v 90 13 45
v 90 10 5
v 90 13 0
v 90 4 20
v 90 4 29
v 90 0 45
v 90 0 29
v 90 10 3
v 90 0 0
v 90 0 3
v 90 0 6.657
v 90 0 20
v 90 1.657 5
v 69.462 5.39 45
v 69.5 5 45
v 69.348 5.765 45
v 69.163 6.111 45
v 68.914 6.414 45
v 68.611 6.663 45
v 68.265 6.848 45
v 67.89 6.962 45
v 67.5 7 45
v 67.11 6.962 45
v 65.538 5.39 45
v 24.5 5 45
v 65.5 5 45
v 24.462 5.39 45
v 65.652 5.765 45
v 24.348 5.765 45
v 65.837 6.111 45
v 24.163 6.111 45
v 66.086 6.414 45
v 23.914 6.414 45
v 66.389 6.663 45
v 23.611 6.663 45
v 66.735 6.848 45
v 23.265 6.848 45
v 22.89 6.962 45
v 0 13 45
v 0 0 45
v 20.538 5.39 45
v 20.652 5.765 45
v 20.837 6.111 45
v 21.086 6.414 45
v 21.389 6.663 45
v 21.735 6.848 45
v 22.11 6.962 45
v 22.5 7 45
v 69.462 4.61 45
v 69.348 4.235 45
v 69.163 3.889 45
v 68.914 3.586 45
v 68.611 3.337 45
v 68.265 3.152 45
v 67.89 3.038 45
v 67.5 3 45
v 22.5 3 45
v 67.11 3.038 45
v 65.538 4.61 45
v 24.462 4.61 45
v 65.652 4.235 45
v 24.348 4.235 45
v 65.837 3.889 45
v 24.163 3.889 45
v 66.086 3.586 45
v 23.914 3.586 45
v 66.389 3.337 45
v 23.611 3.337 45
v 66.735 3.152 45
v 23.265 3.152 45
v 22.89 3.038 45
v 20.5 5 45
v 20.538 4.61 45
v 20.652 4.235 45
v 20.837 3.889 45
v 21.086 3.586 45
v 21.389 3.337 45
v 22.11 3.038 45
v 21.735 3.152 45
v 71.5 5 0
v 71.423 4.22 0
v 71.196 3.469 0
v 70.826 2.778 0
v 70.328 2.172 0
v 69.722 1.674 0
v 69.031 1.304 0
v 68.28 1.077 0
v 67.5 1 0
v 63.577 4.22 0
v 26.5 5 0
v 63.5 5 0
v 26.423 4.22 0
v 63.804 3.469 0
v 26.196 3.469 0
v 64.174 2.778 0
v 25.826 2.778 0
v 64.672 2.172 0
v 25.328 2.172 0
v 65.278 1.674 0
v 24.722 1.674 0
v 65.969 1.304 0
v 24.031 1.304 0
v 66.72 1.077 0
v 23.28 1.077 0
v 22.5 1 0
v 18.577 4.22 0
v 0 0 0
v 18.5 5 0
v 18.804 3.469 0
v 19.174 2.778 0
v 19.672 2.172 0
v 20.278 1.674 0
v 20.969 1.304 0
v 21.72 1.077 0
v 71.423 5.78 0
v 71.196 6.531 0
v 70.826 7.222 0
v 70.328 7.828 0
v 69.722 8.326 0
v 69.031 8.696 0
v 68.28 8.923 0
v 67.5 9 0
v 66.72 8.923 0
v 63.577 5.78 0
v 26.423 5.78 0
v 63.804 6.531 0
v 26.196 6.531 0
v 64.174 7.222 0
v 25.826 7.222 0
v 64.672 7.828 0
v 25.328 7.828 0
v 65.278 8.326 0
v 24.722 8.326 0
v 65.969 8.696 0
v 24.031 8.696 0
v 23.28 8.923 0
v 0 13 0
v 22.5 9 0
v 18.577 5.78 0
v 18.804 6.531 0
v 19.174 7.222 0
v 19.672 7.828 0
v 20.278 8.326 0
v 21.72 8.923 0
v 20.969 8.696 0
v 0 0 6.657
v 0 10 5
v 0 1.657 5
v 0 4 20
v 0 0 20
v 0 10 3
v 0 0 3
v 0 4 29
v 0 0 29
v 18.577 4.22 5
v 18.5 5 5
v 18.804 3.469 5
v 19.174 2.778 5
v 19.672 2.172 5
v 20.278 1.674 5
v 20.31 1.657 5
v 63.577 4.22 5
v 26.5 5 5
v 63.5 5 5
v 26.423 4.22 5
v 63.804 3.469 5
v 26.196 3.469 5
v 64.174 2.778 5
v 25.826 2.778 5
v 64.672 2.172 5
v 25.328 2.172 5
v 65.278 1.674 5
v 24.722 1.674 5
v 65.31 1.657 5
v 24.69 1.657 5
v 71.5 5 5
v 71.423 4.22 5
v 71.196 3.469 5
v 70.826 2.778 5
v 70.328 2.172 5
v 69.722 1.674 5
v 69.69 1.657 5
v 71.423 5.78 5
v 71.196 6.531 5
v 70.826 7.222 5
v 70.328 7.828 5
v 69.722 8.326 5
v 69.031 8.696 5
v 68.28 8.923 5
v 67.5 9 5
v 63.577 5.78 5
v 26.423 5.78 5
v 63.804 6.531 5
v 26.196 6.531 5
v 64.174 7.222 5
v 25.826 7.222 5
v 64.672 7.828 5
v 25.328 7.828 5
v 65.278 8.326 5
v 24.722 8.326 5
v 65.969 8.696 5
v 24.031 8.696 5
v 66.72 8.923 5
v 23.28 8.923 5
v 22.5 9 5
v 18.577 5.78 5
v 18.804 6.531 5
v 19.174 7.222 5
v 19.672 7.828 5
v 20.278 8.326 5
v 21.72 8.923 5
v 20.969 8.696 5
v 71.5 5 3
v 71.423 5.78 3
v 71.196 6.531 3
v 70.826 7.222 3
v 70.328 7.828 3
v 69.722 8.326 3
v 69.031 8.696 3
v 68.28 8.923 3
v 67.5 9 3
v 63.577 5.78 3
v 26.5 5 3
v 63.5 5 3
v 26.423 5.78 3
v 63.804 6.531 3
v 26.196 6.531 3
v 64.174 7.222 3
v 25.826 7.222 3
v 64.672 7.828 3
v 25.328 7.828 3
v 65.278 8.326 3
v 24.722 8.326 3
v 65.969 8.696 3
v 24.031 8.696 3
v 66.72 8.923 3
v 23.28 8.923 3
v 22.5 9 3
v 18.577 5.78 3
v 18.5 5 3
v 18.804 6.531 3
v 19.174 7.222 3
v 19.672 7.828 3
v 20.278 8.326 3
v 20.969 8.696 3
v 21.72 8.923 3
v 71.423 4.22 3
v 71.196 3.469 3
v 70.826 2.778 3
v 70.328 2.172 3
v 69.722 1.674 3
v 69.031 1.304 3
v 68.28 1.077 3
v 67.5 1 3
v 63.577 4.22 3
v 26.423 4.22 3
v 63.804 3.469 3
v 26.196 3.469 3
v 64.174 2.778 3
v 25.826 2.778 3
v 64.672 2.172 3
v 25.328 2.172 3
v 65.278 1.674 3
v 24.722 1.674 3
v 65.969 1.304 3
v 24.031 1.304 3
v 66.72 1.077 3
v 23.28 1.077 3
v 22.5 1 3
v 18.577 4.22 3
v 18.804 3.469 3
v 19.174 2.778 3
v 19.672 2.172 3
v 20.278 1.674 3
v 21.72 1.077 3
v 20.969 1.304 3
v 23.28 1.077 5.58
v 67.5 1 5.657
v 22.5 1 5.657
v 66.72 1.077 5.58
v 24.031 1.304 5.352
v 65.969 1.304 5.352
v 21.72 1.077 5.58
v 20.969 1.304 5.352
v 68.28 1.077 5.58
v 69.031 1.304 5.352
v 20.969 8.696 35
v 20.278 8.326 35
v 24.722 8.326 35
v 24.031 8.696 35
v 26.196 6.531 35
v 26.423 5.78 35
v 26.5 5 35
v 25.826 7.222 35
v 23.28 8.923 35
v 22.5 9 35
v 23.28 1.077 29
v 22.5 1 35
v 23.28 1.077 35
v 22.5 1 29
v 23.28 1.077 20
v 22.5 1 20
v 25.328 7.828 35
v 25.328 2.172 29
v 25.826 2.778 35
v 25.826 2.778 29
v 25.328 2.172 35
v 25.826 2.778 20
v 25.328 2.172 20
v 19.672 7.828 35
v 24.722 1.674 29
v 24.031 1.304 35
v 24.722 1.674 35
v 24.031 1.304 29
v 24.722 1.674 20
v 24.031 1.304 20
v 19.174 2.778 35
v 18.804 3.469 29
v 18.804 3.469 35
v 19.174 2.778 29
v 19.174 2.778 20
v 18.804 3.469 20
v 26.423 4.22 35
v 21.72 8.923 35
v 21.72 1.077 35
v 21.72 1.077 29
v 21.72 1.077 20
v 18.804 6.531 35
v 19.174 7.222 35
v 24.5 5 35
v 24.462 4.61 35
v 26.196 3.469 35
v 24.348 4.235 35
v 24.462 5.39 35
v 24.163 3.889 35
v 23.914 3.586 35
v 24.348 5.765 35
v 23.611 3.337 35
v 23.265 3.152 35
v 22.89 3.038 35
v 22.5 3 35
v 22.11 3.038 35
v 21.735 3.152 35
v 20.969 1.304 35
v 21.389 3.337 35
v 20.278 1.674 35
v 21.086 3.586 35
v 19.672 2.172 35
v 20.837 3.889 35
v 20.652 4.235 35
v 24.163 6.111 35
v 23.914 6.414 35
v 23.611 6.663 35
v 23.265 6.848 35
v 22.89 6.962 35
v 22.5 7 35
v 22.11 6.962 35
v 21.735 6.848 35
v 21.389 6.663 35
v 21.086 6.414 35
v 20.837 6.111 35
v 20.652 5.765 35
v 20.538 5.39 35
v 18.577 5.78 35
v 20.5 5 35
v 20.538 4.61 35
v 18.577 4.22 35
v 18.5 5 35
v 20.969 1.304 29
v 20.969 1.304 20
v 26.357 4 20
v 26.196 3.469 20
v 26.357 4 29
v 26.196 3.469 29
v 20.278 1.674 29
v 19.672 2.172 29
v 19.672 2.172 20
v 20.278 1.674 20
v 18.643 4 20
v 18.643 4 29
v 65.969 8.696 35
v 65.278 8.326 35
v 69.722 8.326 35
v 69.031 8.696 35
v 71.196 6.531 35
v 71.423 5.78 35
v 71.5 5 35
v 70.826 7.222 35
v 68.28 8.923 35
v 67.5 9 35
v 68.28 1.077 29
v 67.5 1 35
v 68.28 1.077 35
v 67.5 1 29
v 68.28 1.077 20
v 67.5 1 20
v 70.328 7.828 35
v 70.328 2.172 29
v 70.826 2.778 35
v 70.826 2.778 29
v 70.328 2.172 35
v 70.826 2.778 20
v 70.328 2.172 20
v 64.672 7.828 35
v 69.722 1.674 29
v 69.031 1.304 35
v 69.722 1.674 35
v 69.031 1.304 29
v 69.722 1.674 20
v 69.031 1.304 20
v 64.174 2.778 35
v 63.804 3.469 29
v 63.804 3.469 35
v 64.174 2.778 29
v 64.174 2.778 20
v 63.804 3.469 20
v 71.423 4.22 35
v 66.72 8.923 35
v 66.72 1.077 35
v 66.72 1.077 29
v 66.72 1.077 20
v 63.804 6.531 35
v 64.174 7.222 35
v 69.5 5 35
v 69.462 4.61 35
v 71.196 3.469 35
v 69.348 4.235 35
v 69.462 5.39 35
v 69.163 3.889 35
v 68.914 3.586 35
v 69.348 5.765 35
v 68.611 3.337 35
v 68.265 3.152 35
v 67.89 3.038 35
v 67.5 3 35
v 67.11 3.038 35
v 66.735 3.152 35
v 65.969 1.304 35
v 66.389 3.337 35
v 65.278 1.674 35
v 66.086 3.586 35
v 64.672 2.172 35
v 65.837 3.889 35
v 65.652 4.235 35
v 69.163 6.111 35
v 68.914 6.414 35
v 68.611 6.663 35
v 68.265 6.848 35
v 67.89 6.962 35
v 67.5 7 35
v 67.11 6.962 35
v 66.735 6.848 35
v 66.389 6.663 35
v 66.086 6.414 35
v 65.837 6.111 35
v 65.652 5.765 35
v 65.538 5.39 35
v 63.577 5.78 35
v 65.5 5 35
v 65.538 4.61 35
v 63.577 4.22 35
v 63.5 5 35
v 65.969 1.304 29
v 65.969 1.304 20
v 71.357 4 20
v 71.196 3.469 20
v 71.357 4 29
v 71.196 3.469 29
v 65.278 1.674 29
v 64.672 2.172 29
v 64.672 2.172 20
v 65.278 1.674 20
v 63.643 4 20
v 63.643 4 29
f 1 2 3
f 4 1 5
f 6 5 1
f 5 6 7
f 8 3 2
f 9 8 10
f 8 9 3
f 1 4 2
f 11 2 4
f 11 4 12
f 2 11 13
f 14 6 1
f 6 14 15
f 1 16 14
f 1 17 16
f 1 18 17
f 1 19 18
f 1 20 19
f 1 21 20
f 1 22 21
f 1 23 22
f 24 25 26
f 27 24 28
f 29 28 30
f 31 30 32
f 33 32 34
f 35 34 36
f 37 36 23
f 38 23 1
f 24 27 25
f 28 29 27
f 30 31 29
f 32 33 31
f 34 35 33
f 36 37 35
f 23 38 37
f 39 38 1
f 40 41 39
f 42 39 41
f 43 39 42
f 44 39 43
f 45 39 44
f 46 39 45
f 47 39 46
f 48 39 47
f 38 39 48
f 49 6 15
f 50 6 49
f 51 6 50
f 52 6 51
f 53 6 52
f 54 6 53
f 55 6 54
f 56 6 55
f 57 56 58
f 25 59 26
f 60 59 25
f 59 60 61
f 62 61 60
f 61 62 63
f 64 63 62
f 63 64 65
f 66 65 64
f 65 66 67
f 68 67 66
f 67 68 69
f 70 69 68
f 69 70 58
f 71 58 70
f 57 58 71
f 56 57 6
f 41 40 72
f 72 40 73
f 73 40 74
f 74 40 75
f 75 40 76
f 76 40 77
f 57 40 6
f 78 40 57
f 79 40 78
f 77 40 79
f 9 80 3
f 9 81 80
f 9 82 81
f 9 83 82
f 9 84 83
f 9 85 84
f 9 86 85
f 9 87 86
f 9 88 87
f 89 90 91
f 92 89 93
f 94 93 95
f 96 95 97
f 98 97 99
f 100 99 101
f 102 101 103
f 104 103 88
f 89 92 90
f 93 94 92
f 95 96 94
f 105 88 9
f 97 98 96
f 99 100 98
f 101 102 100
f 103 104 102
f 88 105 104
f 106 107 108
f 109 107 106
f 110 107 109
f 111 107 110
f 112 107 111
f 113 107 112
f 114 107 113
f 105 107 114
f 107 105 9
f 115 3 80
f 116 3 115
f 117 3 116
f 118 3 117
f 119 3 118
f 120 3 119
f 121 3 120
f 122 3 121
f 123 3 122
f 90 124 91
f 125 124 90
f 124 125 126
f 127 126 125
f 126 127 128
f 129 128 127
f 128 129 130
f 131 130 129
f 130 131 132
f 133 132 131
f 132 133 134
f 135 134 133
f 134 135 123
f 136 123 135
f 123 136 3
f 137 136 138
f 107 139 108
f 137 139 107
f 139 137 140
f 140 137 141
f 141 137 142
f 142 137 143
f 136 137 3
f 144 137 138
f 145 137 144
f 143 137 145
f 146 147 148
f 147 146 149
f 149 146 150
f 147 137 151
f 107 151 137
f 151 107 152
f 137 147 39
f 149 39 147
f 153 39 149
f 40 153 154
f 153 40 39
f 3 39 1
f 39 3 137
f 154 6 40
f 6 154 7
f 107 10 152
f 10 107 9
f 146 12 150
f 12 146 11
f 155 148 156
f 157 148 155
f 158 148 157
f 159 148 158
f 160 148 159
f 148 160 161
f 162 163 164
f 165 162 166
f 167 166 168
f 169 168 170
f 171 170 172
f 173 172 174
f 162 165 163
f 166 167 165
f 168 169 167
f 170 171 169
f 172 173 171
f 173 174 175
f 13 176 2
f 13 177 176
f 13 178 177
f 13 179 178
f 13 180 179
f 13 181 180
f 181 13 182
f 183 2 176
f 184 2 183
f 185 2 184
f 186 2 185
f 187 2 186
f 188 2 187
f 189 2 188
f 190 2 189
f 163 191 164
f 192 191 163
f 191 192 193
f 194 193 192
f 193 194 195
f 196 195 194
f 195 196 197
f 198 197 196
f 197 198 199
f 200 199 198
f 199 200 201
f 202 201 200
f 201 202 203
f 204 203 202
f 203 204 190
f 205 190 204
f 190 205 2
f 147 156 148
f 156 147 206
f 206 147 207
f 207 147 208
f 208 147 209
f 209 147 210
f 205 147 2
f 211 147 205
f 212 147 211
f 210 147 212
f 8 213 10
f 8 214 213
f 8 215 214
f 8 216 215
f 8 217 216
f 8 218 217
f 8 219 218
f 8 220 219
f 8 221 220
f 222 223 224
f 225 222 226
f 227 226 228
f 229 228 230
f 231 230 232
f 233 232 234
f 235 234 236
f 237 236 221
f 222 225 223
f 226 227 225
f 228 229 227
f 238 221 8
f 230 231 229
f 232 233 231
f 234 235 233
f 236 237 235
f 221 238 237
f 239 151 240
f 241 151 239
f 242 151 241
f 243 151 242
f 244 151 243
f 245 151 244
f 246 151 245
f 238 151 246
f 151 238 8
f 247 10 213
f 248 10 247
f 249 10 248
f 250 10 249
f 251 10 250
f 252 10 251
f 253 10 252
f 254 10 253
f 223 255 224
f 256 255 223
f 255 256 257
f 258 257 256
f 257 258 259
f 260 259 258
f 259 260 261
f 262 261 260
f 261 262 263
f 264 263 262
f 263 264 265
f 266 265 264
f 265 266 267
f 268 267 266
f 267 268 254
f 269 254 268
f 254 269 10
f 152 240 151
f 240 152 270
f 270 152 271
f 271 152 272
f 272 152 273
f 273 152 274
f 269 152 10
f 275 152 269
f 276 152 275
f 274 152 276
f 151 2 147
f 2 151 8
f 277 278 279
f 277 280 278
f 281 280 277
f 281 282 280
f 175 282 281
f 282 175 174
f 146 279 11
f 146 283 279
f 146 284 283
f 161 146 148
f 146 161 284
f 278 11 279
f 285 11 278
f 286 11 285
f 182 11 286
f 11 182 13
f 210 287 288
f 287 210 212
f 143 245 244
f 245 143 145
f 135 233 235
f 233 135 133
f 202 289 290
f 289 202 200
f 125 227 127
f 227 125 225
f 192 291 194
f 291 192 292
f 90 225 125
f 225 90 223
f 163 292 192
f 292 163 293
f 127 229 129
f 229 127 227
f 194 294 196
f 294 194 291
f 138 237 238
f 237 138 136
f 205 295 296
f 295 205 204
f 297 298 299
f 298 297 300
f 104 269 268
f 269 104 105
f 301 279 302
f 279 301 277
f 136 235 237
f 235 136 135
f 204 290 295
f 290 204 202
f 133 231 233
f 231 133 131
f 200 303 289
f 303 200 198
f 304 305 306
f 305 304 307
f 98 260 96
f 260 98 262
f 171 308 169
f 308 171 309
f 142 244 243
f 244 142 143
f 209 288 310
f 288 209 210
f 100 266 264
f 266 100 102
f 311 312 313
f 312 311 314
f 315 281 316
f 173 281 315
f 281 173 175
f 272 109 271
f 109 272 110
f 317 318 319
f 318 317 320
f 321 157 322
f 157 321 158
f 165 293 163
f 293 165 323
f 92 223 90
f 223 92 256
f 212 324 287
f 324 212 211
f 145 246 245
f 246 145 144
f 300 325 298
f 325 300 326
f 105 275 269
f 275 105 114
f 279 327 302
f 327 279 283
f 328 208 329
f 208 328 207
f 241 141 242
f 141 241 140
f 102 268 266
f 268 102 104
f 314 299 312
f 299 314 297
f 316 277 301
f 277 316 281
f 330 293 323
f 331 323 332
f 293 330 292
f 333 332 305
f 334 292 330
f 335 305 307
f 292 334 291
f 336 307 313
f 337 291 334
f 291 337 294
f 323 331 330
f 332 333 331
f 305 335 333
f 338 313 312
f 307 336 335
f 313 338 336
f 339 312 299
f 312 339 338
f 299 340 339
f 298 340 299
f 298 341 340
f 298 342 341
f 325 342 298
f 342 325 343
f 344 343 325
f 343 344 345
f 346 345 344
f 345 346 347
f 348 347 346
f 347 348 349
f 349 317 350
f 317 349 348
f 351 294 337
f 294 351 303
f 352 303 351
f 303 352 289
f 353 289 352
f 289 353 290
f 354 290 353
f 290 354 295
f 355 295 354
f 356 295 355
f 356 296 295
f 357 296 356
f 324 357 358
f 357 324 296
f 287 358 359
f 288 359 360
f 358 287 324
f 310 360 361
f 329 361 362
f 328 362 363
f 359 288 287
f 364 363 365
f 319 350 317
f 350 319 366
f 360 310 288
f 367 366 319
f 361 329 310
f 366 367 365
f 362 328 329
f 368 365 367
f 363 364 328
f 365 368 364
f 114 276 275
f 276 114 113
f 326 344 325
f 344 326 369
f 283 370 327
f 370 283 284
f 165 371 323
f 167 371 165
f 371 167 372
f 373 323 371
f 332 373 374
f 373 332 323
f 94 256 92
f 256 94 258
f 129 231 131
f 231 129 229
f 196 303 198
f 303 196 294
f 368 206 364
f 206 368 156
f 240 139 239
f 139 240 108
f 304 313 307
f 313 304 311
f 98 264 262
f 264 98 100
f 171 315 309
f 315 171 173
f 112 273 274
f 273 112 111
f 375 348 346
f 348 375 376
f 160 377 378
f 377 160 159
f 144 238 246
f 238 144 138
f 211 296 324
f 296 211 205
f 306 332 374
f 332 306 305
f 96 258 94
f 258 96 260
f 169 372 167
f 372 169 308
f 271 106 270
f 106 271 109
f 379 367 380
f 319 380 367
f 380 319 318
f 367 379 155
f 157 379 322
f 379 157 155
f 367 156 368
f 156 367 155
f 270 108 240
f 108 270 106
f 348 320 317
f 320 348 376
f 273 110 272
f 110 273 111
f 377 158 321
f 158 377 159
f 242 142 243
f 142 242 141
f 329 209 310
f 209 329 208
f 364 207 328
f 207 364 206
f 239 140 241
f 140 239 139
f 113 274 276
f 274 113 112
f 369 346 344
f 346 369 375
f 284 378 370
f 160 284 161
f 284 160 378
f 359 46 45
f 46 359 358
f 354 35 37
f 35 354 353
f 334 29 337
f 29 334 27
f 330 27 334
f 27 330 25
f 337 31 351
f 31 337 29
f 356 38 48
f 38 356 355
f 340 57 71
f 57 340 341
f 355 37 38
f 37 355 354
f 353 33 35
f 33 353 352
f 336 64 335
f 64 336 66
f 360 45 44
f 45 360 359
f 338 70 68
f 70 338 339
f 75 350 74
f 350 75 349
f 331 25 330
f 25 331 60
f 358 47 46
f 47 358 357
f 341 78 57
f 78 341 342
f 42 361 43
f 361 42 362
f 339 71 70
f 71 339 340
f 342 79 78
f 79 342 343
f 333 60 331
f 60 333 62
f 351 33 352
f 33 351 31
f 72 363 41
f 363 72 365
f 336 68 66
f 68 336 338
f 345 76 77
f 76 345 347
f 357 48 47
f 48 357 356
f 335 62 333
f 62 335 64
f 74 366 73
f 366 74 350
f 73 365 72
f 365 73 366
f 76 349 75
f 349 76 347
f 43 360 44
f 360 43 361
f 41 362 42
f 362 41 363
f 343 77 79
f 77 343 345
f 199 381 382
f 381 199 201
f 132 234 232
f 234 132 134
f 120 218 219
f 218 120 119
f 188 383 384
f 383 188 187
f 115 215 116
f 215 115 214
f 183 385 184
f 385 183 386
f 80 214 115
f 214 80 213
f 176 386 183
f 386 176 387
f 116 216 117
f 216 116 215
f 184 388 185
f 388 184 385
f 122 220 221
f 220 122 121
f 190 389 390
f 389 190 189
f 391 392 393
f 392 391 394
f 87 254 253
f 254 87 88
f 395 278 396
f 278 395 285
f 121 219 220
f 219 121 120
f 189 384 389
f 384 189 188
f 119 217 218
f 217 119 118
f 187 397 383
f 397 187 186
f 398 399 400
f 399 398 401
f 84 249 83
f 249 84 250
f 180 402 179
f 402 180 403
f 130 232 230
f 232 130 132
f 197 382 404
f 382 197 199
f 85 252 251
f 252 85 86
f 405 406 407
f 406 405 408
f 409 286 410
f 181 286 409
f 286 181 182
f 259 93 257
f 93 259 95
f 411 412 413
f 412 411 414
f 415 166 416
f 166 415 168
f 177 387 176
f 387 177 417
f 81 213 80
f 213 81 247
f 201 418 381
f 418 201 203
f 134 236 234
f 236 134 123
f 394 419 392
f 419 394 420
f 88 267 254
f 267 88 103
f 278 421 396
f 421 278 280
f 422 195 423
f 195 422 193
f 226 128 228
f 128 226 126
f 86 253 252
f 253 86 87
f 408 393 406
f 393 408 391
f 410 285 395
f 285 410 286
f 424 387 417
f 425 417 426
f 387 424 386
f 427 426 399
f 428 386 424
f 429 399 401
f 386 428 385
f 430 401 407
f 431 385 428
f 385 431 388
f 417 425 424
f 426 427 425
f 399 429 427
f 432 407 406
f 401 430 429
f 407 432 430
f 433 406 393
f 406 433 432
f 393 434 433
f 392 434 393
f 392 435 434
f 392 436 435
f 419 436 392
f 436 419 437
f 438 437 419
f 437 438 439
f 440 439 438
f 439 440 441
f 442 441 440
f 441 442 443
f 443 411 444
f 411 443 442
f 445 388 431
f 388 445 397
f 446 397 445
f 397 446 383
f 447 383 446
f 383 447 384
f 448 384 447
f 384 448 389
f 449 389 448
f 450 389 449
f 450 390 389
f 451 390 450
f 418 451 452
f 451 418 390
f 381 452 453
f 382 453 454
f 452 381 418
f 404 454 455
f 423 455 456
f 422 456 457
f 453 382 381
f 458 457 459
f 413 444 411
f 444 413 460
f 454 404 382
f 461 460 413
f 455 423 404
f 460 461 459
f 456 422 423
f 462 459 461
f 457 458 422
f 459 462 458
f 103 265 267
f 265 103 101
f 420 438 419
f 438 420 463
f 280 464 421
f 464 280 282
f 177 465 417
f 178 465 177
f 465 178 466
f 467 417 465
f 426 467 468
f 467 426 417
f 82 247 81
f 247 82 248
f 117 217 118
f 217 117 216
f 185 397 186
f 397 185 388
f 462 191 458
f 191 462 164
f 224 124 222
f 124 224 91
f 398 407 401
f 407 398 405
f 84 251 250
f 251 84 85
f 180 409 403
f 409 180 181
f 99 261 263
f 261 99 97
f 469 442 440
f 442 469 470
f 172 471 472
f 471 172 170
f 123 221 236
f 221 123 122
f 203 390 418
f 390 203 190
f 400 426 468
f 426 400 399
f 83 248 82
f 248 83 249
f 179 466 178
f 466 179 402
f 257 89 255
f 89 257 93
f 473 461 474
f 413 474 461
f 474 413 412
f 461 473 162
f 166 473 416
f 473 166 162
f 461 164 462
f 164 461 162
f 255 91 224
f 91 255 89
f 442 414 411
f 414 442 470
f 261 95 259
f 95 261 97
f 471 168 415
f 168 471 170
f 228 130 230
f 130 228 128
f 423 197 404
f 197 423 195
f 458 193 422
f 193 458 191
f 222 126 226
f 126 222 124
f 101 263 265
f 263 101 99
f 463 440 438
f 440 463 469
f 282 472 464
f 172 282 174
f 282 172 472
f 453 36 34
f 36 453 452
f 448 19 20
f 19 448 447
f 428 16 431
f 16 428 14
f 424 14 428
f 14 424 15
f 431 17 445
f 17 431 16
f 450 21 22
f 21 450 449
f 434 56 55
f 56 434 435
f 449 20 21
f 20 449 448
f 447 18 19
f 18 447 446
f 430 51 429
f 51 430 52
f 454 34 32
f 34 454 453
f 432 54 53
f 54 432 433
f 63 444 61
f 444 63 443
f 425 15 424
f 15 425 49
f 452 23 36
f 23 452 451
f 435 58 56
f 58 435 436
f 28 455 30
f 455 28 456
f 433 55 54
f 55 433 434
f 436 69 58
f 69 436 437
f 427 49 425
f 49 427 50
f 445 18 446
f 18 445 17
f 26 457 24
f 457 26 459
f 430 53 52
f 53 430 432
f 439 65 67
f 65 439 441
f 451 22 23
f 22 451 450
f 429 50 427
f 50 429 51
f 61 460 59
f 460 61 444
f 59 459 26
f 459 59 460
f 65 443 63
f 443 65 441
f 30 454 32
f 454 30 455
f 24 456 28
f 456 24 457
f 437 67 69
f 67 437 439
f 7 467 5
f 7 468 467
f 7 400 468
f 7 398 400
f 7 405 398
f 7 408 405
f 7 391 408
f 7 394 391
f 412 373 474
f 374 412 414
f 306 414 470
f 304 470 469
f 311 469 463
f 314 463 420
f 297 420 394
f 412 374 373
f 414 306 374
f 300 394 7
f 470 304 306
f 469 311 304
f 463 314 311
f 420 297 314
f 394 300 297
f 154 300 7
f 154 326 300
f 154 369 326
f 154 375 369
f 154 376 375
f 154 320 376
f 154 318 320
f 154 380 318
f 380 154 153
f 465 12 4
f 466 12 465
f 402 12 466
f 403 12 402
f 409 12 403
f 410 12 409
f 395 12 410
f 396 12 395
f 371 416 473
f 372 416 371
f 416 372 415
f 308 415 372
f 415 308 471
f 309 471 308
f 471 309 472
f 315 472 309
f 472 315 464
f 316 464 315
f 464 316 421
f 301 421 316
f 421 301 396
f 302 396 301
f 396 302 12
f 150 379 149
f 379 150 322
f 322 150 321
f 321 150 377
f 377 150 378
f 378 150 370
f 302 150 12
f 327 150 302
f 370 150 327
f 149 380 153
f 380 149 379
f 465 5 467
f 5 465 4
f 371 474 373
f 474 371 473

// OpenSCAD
//Height of the spacer, default is flush with the mounting surface.
spacer_height = 45; // [45:90]

//Radius of hole to fix screw length.
screw_head_radius = 4; // [2:4.5]

//Radius of screw thread.
screw_radius = 2; // [1:4.5]

//Length of thread to be inside spacer.
screw_length = 10; // [3:45]
head_hole_height = spacer_height - screw_length;

difference() {
	difference() {
		difference() {
			difference() {
				difference() {
					cube(size = [90, 13, spacer_height]);
					translate(v = [0, 0, 3]) {
						cube(size = [90, 10, 2]);
					}
				}
				translate(v = [0, -1, 0]) {
					translate(v = [0, 0, 2]) {
						rotate(a = spacer_height, v = [1, 0, 0]) {
							cube(size = [90, 4, 4]);
						}
					}
				}
			}
			translate(v = [22.5000000000, 0, 0]) {
				translate(v = [0, 5, 0]) {
					union() {
						cylinder($fn = 32, h = head_hole_height, r = screw_head_radius);
						translate(v = [0, 0, head_hole_height]) {
							cylinder($fn = 32, h = screw_length, r = screw_radius);
						}
					}
				}
			}
		}
		translate(v = [67.5000000000, 0, 0]) {
			translate(v = [0, 5, 0]) {
				union() {
					cylinder($fn = 32, h = head_hole_height, r = screw_head_radius);
					translate(v = [0, 0, head_hole_height]) {
						cylinder($fn = 32, h = screw_length, r = screw_radius);
					}
				}
			}
		}
	}
	translate(v = [0, 0, 20]) {
		cube(size = [90, 4, 9]);
	}
}
/***********************************************
*********      SolidPython code:      **********
************************************************
 
''' Mounting spacers for lvpin LP-2020a+ stereo

Spacers which allow an lvpin LP-2020a+ stereo to be mounted under a bench,
table or cabinet. There is a slot to allow for wires to pass through to the
front (I am using them for the power and audio of my music source).

Customised parameters allow different sized screws to be used for mounting.

This work is licensed under a Creative Commons Attribution-ShareAlike 4.0
International License.
http://creativecommons.org/licenses/by-sa/4.0/
'''
import solid as s
import solid.utils as u

spacer_width = 13
spacer_depth = 90
screw_offset = 22.5
screw_offset_2 = spacer_depth - screw_offset

v = s.variables()

v.spacer_height = s.var(45,
                        comment='Height of the spacer, default is flush '
                                'with the mounting surface.',
                        end_comment='[45:90]')
v.screw_head_radius = s.var(4,
                            comment='Radius of hole to fix screw length.',
                            end_comment='[2:4.5]')
v.screw_radius = s.var(2,
                       comment='Radius of screw thread.',
                       end_comment='[1:4.5]')
v.screw_length = s.var(10,
                       comment='Length of thread to be inside spacer.',
                       end_comment='[3:45]')
v.head_hole_height = s.var('spacer_height - screw_length')

body = s.cube(size=[spacer_depth, spacer_width, v.spacer_height])

slot = u.up(3)(s.cube(size=[spacer_depth, 10, 2]))
slot_round = u.back(1)(u.up(2)(
    s.rotate(a=v.spacer_height, v=[1, 0, 0])(
        s.cube(size=[spacer_depth, 4, 4])
    )
))


screw_hole = u.forward(5)(
    s.cylinder(r=v.screw_head_radius, h=v.head_hole_height, segments=32) +
    u.up(v.head_hole_height)(
        s.cylinder(r=v.screw_radius, h=v.screw_length, segments=32)
    )
)

screw_hole_1 = u.right(screw_offset)(screw_hole)
screw_hole_2 = u.right(screw_offset_2)(screw_hole)

wire_run = u.up(20)(s.cube(size=[spacer_depth, 4, 9]))

final = body - slot - slot_round - screw_hole_1 - screw_hole_2 - wire_run

s.scad_render_to_file(final, __file__.replace('.py', '.scad'), variables=v)
 
 
************************************************/
